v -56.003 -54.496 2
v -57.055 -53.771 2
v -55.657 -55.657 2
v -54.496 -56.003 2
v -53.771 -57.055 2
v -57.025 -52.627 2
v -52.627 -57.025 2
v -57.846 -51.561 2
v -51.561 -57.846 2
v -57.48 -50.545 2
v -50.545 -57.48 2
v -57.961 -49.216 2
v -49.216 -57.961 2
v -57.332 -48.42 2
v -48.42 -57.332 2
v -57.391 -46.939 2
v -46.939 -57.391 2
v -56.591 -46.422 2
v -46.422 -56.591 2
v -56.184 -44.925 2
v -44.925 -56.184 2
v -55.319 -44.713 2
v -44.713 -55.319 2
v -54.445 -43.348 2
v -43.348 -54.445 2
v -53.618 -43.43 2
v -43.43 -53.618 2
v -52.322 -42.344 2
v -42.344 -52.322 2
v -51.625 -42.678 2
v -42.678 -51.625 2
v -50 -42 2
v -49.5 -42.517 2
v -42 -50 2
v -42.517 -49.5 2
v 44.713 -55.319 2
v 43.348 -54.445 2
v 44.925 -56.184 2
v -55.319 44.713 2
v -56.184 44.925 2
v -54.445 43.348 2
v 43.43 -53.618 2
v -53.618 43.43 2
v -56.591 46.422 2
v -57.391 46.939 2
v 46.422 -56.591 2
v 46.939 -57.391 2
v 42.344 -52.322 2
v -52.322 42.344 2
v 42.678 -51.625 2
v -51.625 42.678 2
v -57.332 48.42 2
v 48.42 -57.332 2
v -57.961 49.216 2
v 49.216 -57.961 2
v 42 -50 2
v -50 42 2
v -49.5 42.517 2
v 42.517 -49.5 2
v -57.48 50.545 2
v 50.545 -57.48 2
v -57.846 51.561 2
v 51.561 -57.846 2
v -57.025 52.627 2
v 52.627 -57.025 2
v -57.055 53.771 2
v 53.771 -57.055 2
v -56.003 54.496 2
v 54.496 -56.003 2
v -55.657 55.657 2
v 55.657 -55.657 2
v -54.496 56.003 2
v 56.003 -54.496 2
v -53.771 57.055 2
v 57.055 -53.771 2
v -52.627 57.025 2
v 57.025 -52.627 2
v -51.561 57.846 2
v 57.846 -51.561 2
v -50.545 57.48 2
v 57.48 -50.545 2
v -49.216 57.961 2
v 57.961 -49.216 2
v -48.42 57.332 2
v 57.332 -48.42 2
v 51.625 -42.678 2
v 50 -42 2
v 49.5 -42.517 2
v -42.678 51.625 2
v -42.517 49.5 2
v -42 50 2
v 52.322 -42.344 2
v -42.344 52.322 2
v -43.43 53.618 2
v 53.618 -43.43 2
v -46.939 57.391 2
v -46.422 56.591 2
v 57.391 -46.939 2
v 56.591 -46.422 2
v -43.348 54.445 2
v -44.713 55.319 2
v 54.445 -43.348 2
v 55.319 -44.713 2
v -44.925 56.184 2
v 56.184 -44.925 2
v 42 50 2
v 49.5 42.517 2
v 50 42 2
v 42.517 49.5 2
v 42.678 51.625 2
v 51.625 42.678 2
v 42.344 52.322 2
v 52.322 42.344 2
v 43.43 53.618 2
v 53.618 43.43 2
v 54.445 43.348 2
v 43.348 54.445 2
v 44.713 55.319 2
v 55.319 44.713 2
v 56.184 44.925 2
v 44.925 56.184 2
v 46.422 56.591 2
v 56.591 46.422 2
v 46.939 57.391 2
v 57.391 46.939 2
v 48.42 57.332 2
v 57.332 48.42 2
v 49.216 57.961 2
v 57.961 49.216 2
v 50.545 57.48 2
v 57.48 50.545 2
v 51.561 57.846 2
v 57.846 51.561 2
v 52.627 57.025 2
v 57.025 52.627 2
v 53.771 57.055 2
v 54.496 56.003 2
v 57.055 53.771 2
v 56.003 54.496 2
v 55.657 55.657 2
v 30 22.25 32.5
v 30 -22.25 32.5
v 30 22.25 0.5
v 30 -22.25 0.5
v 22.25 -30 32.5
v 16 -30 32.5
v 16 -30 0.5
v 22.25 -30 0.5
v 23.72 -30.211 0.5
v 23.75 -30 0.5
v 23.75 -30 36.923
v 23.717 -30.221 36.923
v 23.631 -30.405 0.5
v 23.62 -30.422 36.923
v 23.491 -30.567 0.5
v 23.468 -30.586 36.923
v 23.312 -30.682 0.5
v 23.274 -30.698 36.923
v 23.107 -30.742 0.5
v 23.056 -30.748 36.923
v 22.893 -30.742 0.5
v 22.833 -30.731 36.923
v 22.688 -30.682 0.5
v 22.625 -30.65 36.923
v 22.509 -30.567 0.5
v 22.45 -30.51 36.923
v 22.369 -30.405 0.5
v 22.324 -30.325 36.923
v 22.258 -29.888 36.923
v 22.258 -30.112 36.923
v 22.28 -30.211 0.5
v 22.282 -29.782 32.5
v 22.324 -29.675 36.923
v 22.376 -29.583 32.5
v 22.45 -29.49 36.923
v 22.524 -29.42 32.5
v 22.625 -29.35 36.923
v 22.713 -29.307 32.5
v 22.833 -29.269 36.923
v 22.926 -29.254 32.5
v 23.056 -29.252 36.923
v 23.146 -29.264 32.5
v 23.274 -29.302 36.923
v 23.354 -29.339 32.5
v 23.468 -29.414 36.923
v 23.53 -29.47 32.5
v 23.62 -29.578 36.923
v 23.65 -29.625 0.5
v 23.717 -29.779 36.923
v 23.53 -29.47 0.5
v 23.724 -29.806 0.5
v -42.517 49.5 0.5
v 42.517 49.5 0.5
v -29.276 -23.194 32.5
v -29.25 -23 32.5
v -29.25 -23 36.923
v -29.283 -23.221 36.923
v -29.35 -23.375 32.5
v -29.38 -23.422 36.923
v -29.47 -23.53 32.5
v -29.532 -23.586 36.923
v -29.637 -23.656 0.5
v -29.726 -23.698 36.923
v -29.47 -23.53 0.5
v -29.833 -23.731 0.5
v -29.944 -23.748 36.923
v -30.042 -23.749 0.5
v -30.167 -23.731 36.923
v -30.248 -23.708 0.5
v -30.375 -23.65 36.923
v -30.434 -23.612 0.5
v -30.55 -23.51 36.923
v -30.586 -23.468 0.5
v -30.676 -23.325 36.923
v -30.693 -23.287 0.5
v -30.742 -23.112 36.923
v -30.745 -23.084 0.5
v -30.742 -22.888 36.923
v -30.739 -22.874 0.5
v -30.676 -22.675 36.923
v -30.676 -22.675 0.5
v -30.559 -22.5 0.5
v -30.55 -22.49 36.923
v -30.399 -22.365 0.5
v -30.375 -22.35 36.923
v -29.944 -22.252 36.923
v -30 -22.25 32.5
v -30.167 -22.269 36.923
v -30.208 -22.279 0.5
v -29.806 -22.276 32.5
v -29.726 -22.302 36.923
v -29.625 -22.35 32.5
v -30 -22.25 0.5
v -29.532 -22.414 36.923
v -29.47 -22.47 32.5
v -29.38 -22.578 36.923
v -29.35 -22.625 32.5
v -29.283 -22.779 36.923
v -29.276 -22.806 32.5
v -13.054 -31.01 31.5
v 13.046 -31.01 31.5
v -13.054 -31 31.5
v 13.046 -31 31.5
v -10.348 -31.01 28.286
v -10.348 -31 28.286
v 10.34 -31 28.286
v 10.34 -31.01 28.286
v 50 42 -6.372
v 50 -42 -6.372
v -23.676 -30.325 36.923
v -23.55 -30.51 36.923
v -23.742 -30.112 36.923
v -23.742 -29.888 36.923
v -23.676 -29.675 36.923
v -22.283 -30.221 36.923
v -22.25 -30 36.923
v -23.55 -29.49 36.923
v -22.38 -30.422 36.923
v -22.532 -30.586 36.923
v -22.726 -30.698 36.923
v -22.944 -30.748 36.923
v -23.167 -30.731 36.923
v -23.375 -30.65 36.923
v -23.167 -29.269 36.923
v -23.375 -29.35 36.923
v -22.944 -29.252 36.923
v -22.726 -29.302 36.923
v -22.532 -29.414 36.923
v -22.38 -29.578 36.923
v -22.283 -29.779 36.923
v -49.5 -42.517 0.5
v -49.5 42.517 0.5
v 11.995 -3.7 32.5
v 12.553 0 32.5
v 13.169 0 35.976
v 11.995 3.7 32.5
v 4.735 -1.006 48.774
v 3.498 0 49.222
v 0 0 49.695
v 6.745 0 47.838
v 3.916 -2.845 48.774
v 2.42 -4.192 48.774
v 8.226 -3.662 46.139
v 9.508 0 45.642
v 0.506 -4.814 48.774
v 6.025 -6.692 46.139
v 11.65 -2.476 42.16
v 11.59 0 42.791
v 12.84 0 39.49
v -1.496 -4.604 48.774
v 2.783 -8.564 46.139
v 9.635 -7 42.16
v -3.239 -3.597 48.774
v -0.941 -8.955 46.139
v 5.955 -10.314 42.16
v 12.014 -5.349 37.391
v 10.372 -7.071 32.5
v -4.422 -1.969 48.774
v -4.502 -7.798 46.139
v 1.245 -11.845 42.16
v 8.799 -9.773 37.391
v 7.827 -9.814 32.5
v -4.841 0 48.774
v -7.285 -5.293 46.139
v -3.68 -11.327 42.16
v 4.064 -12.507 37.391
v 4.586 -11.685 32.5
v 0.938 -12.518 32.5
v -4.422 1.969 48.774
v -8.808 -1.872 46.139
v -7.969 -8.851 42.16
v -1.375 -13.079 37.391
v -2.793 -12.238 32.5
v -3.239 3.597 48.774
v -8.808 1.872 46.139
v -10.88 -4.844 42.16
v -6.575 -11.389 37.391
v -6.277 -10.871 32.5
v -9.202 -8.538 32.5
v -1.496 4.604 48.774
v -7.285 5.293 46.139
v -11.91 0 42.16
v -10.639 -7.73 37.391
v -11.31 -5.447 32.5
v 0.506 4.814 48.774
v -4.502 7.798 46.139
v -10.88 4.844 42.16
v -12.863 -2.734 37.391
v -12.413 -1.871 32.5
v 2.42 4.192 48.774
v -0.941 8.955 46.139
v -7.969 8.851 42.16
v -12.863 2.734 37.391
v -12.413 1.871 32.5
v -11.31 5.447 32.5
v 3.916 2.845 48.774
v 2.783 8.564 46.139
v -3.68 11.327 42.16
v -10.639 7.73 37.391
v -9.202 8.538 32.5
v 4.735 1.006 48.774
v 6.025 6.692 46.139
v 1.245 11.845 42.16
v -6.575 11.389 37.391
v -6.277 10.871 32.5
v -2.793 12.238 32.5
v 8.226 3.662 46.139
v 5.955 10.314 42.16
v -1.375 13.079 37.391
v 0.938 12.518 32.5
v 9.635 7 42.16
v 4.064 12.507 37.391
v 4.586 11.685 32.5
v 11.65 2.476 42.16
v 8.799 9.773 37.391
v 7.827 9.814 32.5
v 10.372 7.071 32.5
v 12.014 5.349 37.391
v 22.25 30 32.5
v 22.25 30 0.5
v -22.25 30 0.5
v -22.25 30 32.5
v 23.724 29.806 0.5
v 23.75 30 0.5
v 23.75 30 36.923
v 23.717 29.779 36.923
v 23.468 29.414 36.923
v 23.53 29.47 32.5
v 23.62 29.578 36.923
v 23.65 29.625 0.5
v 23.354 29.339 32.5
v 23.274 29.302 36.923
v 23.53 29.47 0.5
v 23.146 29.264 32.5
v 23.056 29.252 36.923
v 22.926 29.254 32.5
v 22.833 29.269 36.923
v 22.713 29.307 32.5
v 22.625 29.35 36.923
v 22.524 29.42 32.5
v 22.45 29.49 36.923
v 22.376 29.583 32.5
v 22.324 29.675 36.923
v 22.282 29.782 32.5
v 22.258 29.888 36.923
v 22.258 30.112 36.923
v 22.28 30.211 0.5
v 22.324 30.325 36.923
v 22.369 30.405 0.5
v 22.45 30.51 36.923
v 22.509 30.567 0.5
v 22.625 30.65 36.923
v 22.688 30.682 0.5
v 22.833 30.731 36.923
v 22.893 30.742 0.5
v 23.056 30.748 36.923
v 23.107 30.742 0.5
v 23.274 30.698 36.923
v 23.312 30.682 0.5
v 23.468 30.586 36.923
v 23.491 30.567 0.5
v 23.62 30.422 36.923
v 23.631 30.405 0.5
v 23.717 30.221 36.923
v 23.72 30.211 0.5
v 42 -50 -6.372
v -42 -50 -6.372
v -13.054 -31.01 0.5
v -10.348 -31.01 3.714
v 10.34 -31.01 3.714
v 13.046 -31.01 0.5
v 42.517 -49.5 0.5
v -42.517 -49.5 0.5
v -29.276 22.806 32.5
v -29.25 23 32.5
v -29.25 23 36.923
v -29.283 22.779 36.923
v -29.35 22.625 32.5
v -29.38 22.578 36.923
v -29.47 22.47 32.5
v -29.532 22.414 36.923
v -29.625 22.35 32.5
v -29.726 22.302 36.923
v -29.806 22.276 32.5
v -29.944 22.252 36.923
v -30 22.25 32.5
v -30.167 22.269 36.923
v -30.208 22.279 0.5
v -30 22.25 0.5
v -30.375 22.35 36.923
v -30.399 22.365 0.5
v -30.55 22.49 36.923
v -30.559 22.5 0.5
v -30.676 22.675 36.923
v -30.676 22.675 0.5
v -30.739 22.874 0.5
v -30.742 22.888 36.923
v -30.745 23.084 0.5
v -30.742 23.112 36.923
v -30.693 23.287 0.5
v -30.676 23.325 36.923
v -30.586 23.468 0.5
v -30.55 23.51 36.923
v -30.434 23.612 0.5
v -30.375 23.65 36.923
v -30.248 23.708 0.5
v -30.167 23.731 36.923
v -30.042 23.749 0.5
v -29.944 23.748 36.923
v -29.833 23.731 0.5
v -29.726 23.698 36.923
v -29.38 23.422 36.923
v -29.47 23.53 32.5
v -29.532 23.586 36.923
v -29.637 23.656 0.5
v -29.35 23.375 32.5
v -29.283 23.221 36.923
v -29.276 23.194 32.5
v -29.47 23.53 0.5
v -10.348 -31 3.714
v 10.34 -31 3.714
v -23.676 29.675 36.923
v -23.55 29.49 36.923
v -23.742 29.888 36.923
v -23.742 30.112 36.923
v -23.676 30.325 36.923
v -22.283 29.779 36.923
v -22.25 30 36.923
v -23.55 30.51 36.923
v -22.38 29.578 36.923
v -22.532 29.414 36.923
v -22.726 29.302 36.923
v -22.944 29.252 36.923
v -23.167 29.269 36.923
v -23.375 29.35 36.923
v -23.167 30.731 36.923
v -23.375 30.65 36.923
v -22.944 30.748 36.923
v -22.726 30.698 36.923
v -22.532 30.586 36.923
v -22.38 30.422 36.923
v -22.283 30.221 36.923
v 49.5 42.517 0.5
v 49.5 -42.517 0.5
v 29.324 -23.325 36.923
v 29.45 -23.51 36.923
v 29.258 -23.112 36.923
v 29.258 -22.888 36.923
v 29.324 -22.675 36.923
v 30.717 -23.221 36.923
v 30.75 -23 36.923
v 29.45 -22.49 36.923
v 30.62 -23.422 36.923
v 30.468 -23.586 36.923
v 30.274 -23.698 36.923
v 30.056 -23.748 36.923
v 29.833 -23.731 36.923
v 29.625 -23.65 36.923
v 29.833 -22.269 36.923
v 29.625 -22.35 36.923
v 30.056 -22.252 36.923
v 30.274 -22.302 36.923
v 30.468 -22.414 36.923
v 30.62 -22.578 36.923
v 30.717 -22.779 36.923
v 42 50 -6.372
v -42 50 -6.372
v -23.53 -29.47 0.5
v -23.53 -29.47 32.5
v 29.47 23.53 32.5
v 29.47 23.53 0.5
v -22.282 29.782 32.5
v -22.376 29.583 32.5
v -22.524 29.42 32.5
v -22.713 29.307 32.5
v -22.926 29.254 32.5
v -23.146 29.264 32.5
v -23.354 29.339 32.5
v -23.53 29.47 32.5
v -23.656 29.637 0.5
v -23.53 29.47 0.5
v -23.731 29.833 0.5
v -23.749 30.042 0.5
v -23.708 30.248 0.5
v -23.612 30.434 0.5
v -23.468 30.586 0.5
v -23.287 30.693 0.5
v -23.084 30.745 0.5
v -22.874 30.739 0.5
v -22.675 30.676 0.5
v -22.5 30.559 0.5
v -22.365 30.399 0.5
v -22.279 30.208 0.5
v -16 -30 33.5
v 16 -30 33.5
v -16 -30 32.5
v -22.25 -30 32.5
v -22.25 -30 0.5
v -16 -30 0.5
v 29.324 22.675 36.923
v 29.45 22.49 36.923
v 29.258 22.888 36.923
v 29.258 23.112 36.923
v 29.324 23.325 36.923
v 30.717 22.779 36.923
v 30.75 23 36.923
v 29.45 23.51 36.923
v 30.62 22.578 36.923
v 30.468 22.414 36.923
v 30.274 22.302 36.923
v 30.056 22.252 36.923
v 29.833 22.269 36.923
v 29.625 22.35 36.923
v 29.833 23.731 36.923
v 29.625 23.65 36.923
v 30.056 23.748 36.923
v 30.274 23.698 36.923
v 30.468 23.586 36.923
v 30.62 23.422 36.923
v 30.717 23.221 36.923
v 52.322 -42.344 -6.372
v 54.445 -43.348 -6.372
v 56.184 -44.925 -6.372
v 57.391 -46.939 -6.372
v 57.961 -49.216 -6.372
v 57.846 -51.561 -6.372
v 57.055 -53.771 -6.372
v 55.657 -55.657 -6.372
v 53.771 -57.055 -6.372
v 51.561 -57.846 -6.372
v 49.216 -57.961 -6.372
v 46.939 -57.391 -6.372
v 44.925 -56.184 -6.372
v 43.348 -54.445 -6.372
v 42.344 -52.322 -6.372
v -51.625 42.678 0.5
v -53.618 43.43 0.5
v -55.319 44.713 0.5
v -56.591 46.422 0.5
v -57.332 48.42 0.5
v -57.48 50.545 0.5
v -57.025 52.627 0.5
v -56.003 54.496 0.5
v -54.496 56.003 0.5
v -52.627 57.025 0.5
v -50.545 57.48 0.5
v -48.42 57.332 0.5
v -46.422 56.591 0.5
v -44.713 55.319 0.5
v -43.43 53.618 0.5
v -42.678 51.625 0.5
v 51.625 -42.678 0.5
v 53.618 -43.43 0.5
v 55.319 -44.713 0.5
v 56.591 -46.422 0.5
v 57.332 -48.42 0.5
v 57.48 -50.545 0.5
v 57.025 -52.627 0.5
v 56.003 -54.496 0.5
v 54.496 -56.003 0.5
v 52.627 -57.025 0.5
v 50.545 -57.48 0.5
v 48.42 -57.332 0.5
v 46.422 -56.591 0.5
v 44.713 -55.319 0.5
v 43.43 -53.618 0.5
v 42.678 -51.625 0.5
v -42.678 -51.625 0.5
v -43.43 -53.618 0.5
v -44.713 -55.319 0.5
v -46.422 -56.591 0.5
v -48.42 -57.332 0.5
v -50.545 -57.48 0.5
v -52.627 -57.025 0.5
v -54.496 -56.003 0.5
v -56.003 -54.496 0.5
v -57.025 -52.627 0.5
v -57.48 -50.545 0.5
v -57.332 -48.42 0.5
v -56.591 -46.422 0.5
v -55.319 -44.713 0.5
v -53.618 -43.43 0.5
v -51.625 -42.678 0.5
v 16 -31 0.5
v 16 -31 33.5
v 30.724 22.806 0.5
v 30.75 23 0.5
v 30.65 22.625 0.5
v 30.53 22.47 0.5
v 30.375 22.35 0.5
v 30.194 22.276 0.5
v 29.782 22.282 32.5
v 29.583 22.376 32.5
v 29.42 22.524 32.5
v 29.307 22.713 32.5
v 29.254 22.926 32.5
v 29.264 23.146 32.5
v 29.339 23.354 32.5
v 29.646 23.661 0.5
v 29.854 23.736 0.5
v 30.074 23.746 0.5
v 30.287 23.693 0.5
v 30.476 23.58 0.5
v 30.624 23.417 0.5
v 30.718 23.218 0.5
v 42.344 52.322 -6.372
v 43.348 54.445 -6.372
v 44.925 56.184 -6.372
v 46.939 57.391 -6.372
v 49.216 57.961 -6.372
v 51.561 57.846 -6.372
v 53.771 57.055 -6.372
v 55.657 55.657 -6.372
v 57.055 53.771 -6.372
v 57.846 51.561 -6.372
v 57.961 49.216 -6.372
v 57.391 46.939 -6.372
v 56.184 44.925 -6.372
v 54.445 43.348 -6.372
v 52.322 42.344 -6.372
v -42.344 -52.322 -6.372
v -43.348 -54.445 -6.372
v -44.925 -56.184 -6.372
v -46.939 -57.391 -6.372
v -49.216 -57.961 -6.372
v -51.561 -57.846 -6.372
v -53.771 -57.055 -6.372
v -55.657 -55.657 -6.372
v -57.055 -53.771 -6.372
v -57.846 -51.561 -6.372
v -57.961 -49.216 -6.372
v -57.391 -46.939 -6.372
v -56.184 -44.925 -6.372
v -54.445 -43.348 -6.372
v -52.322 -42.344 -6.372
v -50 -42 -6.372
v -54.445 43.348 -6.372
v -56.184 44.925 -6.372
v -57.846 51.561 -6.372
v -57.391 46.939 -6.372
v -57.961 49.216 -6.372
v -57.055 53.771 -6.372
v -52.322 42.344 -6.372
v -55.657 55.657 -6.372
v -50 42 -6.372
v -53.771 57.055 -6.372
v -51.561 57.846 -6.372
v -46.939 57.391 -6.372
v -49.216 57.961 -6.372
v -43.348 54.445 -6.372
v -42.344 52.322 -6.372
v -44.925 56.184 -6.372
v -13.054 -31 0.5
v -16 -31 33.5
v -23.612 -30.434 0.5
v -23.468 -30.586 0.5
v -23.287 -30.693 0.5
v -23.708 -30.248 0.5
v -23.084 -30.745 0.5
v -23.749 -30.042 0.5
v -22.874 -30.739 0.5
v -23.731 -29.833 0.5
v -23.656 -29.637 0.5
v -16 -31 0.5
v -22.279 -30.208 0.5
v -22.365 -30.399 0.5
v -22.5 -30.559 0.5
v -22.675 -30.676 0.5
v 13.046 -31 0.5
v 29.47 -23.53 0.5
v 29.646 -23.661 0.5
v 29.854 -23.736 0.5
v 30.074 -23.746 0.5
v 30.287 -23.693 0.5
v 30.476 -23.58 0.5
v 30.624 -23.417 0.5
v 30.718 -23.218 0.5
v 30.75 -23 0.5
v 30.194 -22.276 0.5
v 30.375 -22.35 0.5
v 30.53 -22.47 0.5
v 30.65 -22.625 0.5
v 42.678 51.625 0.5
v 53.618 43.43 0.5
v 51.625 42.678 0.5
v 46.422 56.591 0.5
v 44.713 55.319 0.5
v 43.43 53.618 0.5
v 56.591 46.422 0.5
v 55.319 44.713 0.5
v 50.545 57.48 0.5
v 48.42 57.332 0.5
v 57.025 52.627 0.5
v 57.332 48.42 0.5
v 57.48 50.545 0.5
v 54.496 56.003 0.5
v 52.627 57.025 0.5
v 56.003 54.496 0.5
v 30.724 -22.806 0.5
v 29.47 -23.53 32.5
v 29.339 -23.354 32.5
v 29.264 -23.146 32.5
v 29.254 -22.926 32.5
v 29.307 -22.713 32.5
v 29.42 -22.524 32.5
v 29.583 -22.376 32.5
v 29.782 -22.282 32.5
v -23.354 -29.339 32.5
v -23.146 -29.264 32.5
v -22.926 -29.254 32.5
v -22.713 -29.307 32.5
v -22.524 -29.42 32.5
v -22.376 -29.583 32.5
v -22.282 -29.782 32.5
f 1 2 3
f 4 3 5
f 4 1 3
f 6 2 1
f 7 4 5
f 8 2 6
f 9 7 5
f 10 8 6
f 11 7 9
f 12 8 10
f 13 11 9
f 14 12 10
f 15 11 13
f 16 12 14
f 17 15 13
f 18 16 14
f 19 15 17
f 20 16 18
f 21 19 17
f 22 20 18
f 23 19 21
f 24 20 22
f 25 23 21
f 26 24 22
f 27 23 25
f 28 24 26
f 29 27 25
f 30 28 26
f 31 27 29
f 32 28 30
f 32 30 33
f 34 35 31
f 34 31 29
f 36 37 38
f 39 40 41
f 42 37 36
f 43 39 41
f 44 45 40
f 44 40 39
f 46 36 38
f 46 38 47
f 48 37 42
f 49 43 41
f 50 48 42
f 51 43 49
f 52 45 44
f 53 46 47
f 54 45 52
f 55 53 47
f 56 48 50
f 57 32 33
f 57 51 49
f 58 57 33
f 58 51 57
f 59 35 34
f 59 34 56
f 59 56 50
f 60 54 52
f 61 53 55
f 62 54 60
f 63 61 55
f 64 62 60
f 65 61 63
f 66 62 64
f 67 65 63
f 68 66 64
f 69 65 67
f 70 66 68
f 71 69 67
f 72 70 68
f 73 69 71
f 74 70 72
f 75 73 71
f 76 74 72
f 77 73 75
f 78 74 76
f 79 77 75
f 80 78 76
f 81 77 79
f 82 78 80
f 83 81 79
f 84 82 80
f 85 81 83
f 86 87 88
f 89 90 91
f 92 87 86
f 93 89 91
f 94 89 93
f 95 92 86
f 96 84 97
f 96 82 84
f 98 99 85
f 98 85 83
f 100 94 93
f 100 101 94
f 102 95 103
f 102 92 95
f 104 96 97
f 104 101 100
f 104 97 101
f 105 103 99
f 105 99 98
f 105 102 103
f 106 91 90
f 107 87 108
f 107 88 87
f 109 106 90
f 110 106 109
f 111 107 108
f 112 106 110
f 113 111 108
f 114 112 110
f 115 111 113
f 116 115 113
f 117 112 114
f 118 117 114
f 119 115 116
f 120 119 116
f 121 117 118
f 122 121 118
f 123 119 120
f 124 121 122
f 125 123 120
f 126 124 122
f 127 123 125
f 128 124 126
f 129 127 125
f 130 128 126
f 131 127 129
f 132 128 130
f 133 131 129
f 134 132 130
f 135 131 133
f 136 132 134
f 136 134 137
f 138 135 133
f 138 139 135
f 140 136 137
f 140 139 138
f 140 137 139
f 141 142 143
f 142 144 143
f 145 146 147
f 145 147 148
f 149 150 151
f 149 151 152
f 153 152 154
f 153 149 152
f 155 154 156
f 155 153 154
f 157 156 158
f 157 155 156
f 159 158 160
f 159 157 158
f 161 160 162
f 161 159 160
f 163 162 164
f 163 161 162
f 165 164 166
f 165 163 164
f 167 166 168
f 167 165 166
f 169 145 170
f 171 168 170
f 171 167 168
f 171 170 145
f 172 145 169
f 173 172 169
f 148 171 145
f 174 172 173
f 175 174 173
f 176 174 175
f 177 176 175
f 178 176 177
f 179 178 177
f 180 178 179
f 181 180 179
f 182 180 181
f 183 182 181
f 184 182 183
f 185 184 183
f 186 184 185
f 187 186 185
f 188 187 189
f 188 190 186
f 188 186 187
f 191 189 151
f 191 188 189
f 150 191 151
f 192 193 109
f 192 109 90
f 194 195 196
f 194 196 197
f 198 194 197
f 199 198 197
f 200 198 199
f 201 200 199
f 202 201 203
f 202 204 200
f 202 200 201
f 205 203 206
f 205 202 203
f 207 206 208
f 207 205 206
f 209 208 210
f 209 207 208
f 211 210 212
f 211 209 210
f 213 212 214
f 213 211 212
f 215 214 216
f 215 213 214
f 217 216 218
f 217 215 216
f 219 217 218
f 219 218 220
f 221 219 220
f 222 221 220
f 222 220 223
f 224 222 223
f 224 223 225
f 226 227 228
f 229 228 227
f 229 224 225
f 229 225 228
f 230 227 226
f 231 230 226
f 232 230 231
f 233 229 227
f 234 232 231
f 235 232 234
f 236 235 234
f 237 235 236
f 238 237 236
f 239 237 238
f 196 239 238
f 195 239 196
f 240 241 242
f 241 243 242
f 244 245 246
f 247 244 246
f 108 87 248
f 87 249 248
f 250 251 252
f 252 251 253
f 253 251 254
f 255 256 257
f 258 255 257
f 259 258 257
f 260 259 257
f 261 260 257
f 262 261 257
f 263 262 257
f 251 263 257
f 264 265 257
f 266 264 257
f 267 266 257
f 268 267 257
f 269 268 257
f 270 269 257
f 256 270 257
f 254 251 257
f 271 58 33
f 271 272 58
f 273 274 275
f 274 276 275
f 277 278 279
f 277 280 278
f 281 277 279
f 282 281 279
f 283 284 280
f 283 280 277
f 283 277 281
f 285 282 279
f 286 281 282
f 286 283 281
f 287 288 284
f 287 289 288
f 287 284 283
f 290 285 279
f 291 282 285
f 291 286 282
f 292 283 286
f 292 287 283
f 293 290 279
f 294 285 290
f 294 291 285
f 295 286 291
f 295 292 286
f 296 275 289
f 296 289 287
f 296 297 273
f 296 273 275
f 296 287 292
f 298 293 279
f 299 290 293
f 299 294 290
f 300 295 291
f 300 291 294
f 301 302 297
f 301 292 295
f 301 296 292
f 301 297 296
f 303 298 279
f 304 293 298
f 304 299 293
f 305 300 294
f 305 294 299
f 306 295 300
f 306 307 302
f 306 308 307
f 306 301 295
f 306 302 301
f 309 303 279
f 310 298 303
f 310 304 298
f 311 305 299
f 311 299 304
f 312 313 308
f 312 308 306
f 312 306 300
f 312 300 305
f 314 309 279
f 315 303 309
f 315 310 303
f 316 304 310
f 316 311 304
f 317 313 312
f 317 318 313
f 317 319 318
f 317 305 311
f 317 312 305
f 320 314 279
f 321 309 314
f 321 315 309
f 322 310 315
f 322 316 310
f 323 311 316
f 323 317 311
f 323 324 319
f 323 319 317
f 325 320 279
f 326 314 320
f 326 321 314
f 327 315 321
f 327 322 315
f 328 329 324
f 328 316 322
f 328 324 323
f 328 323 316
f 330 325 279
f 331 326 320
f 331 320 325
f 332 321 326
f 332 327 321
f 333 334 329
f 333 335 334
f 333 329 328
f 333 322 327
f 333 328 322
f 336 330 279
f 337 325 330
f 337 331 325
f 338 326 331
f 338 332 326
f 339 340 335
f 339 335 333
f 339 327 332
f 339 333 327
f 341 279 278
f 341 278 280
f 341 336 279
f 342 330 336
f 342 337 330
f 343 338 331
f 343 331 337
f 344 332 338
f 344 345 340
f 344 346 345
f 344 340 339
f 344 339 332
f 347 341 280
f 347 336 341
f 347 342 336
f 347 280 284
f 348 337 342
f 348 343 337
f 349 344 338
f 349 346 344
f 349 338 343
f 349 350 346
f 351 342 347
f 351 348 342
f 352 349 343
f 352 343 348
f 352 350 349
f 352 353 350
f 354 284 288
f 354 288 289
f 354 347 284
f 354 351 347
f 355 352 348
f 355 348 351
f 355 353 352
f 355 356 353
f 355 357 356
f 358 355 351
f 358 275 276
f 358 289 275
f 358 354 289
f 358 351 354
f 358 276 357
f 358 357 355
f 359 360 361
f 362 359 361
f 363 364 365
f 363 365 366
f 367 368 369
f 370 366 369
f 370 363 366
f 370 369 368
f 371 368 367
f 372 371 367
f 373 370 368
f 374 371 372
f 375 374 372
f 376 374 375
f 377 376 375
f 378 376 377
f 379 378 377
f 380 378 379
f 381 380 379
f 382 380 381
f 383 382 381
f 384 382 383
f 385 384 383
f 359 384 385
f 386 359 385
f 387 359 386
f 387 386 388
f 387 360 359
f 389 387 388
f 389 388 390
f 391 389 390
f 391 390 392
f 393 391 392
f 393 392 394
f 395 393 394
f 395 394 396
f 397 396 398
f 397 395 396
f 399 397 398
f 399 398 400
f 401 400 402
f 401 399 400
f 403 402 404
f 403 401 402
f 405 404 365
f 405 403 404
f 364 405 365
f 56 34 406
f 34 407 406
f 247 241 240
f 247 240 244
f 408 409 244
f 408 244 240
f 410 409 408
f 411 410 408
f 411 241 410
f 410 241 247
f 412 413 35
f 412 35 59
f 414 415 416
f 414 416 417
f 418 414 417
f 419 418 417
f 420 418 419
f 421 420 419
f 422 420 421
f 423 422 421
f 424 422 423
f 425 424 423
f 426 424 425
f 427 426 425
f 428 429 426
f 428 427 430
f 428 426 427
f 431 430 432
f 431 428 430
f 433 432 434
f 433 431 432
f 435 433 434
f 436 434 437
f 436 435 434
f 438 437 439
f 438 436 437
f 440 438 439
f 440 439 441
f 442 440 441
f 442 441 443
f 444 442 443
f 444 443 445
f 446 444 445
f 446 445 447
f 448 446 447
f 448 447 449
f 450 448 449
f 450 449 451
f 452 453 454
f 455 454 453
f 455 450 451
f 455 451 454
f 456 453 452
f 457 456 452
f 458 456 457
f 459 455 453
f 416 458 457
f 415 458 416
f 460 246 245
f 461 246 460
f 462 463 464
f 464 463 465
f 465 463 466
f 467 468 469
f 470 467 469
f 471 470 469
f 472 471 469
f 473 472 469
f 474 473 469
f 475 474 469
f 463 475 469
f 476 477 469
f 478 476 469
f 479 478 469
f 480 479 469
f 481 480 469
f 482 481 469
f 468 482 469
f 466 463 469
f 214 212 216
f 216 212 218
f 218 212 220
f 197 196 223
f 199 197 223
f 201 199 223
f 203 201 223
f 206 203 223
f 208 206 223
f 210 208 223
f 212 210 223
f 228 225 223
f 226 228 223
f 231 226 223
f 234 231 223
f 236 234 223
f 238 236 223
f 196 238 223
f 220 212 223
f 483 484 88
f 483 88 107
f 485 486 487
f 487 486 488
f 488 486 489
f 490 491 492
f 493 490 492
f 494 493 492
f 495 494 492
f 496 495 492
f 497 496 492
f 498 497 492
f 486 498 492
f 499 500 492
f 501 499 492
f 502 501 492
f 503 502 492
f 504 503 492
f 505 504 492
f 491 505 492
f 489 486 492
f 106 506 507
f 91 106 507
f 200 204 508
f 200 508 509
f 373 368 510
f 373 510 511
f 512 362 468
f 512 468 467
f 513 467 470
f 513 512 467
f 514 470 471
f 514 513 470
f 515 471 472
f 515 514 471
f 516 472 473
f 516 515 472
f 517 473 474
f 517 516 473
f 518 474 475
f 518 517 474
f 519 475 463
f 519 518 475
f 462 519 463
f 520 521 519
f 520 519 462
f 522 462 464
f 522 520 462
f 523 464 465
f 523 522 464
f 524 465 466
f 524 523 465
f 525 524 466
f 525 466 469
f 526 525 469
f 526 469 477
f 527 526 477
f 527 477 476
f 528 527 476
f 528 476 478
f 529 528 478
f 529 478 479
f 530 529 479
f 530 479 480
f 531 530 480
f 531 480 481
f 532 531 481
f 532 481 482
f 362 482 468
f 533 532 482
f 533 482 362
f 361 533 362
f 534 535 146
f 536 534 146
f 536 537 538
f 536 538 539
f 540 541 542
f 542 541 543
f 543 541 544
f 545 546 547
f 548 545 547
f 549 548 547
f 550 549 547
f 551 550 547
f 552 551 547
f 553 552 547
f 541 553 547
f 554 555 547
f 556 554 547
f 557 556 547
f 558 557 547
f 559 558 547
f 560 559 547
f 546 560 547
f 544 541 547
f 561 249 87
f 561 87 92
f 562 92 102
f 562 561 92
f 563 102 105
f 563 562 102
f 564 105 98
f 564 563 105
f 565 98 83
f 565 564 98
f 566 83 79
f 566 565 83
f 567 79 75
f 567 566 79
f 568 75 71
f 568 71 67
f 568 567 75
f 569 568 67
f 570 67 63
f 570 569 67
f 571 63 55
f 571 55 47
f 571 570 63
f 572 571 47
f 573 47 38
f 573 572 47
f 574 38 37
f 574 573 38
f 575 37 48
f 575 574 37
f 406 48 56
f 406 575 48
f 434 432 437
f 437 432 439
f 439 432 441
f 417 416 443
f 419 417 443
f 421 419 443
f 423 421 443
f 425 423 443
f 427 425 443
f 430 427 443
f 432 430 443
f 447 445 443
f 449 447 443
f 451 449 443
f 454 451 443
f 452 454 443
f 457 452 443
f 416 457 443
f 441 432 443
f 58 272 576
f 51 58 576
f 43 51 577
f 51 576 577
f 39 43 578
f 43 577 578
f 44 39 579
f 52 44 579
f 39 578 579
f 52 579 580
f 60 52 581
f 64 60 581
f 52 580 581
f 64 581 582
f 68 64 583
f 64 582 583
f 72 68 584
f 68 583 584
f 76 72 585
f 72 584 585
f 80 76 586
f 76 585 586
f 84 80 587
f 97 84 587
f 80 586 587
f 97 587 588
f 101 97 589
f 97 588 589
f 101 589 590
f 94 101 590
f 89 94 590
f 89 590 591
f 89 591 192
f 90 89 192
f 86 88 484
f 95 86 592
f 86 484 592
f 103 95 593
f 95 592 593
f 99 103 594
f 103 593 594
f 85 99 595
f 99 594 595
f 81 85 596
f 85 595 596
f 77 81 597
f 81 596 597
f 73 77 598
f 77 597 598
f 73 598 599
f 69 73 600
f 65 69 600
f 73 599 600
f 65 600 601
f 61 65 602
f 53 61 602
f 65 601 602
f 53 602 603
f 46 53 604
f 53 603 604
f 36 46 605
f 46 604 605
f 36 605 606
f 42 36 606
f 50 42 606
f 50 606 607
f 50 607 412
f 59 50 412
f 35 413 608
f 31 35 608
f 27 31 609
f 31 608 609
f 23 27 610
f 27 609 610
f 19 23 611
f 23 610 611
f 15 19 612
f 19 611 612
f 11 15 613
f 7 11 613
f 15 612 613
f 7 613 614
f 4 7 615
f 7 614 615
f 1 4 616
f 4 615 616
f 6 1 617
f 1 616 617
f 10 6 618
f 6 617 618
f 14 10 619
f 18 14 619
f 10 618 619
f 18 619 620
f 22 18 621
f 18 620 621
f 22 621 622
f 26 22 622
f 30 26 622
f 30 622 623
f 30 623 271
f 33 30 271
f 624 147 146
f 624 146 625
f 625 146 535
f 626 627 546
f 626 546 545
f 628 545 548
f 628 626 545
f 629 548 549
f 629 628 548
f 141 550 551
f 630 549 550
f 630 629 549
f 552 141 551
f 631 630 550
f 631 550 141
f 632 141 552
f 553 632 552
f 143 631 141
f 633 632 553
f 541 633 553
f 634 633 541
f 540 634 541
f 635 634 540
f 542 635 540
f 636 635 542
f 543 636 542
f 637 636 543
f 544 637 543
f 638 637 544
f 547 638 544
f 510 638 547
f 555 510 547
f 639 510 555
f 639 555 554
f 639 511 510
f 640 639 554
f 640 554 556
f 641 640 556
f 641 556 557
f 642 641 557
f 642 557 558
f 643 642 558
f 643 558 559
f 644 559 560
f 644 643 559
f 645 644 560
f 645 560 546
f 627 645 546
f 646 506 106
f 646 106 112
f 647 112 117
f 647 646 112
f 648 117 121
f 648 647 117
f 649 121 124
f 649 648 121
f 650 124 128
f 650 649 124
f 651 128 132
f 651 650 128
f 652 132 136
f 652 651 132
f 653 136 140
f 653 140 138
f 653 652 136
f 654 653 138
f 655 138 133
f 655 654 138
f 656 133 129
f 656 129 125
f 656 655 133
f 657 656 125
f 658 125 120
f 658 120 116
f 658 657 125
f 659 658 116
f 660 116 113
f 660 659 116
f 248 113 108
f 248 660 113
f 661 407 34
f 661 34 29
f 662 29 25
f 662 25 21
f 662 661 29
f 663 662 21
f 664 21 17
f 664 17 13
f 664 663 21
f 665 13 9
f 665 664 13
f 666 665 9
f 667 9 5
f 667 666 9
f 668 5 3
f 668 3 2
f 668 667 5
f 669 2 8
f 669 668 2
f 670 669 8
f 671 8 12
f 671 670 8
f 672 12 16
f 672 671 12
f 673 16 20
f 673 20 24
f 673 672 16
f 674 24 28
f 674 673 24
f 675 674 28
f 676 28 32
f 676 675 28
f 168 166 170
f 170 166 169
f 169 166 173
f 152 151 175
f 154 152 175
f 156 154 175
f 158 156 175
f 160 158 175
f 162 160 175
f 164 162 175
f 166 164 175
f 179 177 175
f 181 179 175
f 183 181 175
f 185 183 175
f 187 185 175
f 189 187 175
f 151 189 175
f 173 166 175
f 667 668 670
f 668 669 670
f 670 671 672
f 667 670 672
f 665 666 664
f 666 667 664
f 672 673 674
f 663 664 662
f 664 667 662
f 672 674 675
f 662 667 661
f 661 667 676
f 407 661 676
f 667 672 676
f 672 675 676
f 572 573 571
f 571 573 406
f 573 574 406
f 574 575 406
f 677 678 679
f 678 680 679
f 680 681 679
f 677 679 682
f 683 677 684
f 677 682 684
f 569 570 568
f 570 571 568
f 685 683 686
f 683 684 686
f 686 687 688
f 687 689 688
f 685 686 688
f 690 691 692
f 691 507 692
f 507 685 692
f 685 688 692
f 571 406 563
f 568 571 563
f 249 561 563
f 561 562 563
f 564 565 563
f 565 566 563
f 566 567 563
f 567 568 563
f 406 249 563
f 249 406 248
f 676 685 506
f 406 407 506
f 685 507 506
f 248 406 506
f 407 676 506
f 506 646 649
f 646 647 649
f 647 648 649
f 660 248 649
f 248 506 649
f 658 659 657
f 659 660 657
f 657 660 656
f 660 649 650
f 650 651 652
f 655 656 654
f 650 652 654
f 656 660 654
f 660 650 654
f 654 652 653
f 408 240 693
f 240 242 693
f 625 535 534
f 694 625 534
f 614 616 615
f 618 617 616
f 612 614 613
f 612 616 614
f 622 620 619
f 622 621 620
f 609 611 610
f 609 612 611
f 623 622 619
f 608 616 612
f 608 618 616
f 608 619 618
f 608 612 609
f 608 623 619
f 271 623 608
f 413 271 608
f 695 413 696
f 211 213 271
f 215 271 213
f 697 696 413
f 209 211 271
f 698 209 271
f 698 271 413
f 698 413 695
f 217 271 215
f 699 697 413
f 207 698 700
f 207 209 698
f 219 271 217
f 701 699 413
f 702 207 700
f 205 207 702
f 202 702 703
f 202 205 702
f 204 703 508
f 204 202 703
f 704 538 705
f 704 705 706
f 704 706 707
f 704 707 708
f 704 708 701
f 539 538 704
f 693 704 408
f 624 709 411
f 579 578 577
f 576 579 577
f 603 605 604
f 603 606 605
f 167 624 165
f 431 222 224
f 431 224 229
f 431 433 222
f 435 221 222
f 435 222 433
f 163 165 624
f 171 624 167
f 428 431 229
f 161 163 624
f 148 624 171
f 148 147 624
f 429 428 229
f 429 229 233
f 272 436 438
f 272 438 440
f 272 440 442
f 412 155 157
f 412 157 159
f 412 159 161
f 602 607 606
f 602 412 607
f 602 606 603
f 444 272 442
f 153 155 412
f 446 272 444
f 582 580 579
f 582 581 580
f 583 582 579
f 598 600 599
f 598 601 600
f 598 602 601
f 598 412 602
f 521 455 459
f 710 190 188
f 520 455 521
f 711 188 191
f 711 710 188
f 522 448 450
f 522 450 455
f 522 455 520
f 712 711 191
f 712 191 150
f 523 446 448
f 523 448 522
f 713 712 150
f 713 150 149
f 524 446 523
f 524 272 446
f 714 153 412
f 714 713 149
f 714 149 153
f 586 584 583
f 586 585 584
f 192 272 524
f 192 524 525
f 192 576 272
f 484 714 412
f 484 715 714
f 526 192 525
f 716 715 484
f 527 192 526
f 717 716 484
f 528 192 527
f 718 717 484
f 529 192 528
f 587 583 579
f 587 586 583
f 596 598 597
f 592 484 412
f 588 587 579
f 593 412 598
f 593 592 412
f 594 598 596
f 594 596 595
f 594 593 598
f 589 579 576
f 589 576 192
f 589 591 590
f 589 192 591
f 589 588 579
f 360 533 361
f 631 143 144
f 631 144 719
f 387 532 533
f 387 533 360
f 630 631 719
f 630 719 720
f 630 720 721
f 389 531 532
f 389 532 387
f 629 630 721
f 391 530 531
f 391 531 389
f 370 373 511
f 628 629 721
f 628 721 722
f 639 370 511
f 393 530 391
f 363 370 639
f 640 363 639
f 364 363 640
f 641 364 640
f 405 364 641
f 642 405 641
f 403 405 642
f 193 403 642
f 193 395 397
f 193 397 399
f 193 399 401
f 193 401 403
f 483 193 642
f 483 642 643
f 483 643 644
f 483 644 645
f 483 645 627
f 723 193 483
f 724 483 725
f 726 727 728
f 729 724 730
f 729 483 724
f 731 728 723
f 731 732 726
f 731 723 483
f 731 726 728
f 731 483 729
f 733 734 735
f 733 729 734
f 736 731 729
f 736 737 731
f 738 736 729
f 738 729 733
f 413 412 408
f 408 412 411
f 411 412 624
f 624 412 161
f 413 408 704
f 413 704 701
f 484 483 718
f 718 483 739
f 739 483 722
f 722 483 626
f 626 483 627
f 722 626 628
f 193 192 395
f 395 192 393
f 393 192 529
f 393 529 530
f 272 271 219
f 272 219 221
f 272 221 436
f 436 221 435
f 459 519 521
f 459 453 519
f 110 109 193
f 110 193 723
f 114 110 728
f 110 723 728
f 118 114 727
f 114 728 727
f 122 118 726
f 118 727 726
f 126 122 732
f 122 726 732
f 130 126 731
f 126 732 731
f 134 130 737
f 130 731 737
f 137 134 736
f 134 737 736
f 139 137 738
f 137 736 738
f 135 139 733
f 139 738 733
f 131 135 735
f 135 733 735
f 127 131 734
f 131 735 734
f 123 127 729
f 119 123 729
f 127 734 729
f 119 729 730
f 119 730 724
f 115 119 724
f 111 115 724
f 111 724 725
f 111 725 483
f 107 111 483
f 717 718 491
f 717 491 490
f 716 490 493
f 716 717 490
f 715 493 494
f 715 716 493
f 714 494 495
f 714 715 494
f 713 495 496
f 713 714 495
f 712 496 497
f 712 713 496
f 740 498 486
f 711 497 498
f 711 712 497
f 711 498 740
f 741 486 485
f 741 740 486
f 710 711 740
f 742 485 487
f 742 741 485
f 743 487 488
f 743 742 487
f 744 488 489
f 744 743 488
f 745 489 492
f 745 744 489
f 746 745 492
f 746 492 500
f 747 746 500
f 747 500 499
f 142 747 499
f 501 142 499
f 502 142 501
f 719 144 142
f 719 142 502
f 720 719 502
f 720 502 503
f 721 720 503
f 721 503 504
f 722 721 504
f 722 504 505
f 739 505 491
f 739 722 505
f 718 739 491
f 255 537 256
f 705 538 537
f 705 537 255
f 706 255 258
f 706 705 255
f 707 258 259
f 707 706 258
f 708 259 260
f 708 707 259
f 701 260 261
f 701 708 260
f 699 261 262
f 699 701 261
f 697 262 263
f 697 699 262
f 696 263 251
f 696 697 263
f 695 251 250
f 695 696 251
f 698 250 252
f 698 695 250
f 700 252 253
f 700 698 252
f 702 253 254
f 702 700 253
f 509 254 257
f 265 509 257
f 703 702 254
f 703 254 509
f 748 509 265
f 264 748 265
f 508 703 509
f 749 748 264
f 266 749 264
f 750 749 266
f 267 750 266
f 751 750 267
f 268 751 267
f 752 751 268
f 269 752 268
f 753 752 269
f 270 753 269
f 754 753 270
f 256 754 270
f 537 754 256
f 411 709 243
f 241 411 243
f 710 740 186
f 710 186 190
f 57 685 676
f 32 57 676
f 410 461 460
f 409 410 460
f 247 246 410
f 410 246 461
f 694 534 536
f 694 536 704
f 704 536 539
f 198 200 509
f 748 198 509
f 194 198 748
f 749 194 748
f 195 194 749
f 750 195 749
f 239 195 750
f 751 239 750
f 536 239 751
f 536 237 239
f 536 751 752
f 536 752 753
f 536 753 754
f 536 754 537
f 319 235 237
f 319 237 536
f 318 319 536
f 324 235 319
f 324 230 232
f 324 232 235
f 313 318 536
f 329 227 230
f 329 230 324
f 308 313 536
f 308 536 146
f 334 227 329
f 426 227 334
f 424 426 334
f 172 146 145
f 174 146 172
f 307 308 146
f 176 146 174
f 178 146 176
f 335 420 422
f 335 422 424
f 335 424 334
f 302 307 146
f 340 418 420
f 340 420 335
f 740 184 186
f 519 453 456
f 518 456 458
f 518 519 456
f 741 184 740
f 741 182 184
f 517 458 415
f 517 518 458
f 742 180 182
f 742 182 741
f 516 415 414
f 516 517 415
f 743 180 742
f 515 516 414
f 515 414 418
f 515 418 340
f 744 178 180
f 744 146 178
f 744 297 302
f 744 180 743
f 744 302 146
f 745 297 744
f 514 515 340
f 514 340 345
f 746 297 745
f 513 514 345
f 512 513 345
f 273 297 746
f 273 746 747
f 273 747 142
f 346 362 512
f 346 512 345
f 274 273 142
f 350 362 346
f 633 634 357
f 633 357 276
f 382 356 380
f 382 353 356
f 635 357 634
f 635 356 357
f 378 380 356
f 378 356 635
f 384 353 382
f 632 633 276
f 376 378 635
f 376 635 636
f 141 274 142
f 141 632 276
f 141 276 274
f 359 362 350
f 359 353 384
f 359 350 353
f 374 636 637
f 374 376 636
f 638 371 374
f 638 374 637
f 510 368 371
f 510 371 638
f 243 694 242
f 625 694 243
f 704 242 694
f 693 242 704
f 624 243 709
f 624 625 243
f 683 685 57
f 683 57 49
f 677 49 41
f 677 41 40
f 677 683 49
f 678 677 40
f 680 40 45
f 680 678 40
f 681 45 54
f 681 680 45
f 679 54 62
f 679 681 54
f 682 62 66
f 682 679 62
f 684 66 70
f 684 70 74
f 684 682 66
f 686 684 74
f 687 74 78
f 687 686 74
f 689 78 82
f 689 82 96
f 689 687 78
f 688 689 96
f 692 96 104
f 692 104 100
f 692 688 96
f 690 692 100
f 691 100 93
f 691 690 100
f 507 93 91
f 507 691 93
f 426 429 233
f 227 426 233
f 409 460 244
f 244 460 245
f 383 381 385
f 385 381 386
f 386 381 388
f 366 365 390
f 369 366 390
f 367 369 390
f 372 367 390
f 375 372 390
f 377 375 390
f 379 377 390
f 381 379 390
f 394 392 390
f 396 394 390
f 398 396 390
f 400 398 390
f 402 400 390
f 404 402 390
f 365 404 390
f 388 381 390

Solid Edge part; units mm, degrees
sketch "Sketch1" plane through (0, 0, 0) normal (0, 0, 1) x (1, 0, 0)
  line L0 (-42, -50) -> (42, -50)
  line L1 (50, -42) -> (50, 42)
  line L2 (42, 50) -> (-42, 50)
  line L3 (-50, 42) -> (-50, -42)
  arc A0 (50, -42) -> (42, -50) centre (50, -50) cw
  arc A1 (42, 50) -> (50, 42) centre (50, 50) cw
  arc A2 (-50, 42) -> (-42, 50) centre (-50, 50) cw
  arc A3 (-42, -50) -> (-50, -42) centre (-50, -50) cw
extrude "Protrusion1" add sketch "Sketch1" along normal blind 2
shell "Thinwall_3" thickness 0.5 removed faces 1 at (-39.8267, -37.5067, 2)
sketch "Sketch2" plane through (0, 0, 0) normal (0, 0, 1) x (1, 0, 0)
  line L0 (-50, 42) -> (-50, -42)
  line L1 (42, 50) -> (-42, 50)
  line L2 (50, -42) -> (50, 42)
  line L3 (-42, -50) -> (42, -50)
  arc A0 (-42, -50) -> (-50, -42) centre (-50, -50) cw
  arc A1 (-50, 42) -> (-42, 50) centre (-50, 50) cw
  arc A2 (42, 50) -> (50, 42) centre (50, 50) cw
  arc A3 (50, -42) -> (42, -50) centre (50, -50) cw
extrude "ExtrudedProtrusion_6" add sketch "Sketch2" against normal blind 6.3715
sketch "Sketch3" plane through (0, 0, 0.5) normal (0, 0, 1) x (1, 0, 0)
  line L0 (-30, -30) -> (30, -30)
  line L1 (30, -30) -> (30, 30)
  line L2 (30, 30) -> (-30, 30)
  line L3 (-30, 30) -> (-30, -30)
extrude "ExtrudedProtrusion_7" add sketch "Sketch3" along normal blind 32
chamfer "Chamfer_2" distance 7 angle 45 4 edges at (-30, -30, 16.5) (30, -30, 16.5) (-30, 30, 16.5) (30, 30, 16.5)
sketch "Sketch4" plane through (0, 0, 0) normal (0, -1, 0) x (1, 0, 0)
  line L0 (0, 32.5) -> (12.5531, 32.5)
  line L1 (0, 32.5) -> (0, 36.5152)
  line L2 (0, 36.5152) -> (0, 49.6949)
  arc A0 (0, 49.6949) -> (12.5532, 32.5) centre (0, 36.5152) cw
revolve "RevolvedProtrusion1" add sketch "Sketch4" angle 360 about axis through (0, 0, 36.5152) along (0, 0, 1)
sketch "Sketch5" plane through (0, 0, -6.3715) normal (0, 0, -1) x (1, 0, 0)
  circle A0 centre (-30, 23) radius 0.75
  circle A1 centre (-23, 30) radius 0.75
  circle A2 centre (23, 30) radius 0.75
  circle A3 centre (30, 23) radius 0.75
  circle A4 centre (30, -23) radius 0.75
  circle A5 centre (23, -30) radius 0.75
  circle A6 centre (-30, -23) radius 0.75
  circle A7 centre (-23, -30) radius 0.75
extrude "ExtrudedProtrusion_10" add sketch "Sketch5" against normal blind 43.2945
sketch "Sketch6" plane through (0, -30, 16.5) normal (0, -1, 0) x (1, 0, 0)
  line L0 (16, 17) -> (-16, 17)
  line L1 (-16, 17) -> (-16, -16)
  line L2 (-16, -16) -> (0, -16)
  line L3 (0, -16) -> (16, -16)
  line L4 (16, -16) -> (16, 17)
extrude "ExtrudedProtrusion_11" add sketch "Sketch6" along normal blind 1
sketch "Sketch7" plane through (0, -31, 17) normal (0, -1, 0) x (1, 0, 0)
  line L0 (-10.3485, -13.2862) -> (-10.3485, 11.2862)
  line L1 (-10.3485, 11.2862) -> (10.3398, 11.2862)
  line L2 (10.3398, 11.2862) -> (10.3398, -13.2862)
  line L3 (10.3398, -13.2862) -> (-10.3485, -13.2862)
  line L4 (13.0457, 14.5) -> (-13.0543, 14.5)
  line L5 (-13.0543, 14.5) -> (-13.0543, -16.5)
  line L6 (-13.0543, -16.5) -> (13.0457, -16.5)
  line L7 (13.0457, -16.5) -> (13.0457, 14.5)
extrude "Protrusion2" add sketch "Sketch7" along normal blind 0.01
